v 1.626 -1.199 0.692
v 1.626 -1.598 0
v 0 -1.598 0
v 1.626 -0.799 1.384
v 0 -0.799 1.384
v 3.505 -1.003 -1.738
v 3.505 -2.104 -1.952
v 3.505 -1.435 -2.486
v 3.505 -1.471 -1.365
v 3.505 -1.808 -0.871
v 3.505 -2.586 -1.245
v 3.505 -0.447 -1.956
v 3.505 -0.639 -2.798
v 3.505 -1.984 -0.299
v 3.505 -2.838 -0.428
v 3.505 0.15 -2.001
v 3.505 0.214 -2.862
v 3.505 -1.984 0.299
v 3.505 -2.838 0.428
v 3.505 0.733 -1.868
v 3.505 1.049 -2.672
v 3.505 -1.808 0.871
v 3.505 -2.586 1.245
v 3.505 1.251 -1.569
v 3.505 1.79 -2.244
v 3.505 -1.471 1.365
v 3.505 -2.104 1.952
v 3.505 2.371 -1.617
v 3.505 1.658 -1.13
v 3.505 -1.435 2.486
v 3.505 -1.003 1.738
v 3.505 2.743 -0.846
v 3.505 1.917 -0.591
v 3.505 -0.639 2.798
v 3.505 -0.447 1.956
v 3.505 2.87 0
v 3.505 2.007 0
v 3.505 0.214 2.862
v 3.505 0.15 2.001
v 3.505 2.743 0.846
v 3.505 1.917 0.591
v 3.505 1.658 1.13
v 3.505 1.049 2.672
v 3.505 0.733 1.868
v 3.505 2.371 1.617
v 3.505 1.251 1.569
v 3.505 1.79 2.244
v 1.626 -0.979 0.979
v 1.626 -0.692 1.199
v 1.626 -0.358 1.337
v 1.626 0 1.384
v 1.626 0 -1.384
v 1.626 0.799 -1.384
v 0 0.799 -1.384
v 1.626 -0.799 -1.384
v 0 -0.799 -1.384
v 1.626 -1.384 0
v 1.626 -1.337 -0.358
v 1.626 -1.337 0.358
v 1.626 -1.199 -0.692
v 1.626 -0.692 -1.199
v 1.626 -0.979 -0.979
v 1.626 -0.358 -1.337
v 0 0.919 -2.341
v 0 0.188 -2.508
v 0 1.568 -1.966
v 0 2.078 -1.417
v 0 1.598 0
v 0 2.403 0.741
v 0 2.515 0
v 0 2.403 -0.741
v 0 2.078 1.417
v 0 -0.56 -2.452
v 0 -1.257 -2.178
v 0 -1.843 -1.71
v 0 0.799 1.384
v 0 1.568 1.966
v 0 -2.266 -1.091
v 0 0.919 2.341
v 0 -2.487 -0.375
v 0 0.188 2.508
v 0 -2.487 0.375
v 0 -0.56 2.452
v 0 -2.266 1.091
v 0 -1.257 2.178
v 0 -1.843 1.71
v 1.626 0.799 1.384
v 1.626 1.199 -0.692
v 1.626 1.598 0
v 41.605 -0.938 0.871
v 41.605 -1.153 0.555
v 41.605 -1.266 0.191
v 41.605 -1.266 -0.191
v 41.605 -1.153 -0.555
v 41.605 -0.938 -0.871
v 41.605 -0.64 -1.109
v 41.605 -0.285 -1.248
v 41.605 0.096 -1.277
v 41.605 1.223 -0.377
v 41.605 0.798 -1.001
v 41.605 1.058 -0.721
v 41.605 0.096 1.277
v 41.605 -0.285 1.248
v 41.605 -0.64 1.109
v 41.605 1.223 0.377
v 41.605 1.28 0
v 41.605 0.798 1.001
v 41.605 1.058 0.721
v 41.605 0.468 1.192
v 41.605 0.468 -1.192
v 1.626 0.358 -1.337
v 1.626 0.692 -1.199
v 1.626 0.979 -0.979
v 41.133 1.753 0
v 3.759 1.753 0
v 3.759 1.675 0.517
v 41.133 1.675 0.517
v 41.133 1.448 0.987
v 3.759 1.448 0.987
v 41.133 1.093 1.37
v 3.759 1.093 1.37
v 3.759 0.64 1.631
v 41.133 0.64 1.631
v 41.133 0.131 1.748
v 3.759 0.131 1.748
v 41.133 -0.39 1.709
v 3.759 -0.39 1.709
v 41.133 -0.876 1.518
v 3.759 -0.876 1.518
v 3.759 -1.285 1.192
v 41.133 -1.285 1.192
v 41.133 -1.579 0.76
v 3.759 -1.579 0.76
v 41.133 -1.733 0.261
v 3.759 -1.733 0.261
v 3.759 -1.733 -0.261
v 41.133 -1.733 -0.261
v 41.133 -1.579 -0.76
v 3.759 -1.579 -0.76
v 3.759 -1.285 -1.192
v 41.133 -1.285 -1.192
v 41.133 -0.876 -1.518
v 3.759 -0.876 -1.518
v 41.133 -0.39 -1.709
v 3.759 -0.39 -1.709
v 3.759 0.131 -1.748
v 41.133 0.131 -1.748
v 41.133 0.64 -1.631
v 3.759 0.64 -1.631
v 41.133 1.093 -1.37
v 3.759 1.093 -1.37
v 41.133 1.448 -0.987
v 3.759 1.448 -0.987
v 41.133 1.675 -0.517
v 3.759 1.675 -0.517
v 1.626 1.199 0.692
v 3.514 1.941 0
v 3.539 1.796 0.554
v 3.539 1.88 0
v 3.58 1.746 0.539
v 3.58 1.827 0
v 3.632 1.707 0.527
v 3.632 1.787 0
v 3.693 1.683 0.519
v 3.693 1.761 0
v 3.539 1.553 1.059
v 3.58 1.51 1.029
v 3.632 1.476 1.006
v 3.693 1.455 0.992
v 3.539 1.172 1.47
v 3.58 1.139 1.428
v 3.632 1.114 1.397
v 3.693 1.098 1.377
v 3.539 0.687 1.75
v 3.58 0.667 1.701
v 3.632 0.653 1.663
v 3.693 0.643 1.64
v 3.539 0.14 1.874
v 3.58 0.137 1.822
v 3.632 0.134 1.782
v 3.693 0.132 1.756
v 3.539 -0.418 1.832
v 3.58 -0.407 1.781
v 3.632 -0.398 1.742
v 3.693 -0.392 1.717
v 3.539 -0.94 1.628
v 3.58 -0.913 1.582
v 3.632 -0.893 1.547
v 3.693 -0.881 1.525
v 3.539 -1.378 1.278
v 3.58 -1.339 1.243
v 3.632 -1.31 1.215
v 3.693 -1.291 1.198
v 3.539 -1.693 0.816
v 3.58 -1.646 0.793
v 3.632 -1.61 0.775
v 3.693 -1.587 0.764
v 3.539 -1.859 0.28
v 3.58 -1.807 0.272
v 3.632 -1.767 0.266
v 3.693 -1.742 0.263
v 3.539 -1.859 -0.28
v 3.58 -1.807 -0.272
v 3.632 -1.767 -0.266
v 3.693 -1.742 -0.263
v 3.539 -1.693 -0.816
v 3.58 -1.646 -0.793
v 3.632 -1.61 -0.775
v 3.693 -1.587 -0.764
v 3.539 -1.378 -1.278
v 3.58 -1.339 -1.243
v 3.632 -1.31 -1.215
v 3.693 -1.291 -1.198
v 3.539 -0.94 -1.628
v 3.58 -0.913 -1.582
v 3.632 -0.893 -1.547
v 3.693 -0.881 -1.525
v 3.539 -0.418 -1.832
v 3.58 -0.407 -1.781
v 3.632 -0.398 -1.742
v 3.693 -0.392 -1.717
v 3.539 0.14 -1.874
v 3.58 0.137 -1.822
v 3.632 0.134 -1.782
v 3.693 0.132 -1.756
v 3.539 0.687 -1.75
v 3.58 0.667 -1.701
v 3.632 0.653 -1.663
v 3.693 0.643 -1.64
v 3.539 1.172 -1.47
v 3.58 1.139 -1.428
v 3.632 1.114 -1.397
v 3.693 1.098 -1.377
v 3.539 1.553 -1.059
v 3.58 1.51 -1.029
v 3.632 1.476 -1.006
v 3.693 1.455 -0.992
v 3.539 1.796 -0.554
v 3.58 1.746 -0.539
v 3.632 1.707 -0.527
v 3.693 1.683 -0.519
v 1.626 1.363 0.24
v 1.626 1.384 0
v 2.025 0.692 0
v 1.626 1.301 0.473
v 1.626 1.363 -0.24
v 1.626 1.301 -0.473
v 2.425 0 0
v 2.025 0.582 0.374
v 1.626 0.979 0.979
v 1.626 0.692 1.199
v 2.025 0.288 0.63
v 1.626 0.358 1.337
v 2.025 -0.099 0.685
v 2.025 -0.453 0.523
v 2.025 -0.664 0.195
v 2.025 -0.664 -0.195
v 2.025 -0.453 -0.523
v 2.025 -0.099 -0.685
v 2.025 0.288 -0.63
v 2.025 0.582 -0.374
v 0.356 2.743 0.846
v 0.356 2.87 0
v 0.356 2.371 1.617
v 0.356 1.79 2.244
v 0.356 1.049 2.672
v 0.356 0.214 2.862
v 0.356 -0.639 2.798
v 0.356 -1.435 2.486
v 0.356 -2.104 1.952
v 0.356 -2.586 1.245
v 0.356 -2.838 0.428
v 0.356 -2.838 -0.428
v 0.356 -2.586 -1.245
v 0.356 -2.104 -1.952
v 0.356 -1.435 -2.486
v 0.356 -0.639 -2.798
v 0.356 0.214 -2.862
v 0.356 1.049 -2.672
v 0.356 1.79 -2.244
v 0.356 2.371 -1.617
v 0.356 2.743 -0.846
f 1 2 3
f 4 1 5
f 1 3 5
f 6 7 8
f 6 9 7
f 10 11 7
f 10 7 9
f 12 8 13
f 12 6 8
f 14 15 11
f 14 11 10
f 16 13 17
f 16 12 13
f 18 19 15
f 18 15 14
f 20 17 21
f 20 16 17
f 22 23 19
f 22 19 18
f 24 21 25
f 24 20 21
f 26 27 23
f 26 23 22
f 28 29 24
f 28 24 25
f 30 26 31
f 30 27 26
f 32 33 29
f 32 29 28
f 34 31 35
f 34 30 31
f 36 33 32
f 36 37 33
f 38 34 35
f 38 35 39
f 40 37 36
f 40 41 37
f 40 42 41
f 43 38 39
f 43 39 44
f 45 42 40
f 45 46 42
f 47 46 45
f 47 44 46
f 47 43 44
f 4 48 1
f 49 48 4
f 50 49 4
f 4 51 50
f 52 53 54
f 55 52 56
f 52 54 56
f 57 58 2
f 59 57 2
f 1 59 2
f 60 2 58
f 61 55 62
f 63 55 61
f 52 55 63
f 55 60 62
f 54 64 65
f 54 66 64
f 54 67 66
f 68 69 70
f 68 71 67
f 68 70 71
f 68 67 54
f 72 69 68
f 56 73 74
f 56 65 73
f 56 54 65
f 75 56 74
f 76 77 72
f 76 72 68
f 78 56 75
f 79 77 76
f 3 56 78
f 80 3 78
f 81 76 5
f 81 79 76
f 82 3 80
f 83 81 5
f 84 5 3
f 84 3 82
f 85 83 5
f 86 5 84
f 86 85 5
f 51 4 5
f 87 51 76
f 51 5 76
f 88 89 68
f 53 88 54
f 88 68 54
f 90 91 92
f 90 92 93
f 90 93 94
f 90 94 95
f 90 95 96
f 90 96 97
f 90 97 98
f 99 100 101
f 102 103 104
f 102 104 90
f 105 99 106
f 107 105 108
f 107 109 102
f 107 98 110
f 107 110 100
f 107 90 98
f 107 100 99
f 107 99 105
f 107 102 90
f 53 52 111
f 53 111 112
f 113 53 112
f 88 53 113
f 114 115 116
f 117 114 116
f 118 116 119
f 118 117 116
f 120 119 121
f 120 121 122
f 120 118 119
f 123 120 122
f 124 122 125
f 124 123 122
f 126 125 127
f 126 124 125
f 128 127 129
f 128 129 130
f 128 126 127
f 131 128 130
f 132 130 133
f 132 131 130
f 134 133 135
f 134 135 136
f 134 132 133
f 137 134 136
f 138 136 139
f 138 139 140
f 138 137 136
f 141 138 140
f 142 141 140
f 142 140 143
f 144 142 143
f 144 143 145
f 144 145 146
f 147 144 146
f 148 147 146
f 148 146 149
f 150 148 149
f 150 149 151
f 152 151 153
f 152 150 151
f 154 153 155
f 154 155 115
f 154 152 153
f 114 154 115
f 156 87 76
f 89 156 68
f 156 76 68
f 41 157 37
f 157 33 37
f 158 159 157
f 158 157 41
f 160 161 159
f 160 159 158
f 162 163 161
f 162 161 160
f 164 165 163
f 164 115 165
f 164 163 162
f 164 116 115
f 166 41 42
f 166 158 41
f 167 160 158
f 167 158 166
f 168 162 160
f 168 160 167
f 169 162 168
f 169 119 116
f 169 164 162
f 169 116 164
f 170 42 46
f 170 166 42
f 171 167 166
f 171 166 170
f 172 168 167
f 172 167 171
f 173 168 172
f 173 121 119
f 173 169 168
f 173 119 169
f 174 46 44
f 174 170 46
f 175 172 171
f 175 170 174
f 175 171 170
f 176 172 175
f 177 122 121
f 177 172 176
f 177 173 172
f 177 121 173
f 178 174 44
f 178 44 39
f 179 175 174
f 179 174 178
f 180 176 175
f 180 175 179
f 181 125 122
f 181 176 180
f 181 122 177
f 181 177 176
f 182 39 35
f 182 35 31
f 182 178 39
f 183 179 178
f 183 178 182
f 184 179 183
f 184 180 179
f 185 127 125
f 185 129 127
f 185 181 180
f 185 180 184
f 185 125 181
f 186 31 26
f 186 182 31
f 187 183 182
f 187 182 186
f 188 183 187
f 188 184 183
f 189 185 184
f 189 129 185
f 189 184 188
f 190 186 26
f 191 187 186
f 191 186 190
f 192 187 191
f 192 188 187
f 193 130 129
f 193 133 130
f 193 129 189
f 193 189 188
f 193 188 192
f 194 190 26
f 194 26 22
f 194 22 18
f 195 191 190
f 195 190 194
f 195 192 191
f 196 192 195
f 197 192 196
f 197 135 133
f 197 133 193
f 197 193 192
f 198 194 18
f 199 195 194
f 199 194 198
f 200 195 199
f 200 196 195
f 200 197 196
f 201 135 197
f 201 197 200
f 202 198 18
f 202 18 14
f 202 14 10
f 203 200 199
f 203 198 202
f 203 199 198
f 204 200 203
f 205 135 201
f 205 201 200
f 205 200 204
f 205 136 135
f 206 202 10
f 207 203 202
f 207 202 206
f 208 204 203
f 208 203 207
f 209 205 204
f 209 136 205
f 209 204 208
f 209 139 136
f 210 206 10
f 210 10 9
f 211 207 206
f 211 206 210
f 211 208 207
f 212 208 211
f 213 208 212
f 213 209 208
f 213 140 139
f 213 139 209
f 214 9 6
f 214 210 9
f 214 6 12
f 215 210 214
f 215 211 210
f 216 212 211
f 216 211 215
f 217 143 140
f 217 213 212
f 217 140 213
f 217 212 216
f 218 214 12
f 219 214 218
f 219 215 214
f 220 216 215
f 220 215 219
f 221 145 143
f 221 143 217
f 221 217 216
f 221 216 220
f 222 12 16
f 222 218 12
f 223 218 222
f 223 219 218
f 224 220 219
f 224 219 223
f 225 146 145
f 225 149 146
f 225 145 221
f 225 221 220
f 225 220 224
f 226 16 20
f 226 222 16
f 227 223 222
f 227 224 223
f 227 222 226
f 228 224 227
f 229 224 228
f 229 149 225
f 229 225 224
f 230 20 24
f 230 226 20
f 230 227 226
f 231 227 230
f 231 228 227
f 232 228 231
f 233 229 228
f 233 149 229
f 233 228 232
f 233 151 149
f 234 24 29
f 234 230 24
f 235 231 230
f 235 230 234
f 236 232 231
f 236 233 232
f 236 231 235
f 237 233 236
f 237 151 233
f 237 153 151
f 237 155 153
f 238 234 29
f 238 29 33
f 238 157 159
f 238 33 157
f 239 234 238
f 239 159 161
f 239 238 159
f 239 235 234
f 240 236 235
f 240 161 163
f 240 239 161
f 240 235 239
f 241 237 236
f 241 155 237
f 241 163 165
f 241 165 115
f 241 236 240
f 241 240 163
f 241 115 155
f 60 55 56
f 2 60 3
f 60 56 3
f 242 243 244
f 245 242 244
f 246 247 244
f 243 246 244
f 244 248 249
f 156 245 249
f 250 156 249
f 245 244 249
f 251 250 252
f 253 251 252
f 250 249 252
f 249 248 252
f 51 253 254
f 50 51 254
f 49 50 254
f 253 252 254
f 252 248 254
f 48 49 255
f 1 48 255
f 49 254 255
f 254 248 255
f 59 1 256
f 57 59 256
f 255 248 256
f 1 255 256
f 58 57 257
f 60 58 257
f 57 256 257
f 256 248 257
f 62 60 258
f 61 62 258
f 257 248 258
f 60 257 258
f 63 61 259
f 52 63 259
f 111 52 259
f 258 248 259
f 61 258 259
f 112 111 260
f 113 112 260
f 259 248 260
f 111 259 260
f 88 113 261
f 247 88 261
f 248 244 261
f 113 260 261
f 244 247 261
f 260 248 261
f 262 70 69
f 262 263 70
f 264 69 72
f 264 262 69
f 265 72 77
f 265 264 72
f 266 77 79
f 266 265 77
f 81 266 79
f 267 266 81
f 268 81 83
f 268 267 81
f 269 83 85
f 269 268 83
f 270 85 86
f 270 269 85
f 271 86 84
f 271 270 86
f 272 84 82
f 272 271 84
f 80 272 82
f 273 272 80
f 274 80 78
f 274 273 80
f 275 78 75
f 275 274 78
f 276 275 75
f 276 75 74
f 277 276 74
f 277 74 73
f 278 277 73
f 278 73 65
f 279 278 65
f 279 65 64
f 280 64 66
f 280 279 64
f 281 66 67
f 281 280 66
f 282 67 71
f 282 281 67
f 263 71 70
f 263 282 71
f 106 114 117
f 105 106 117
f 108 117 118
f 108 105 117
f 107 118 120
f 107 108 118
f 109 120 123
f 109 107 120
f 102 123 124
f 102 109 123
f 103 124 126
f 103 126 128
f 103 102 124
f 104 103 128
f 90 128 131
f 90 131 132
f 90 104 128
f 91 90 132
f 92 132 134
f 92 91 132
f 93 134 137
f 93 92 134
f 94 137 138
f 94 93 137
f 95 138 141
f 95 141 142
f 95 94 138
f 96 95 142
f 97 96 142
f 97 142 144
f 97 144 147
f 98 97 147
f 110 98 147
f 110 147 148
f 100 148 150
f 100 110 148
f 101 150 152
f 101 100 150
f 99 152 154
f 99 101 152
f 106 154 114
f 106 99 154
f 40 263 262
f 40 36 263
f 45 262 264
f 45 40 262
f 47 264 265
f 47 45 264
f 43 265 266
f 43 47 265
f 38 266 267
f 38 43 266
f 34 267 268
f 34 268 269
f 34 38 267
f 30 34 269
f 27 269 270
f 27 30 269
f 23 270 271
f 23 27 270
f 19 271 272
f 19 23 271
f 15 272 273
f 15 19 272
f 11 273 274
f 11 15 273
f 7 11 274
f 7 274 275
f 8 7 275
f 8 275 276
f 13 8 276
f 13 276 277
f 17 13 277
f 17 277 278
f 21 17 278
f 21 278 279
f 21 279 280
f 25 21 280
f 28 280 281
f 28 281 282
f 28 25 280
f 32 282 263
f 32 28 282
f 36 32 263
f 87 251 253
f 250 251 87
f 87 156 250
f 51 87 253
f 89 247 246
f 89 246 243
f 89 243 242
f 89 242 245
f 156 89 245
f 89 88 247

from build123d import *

# Parameters (mm, degrees)
FILLET1_R   = 0.254
HEX_2_DEPTH = 1.6256


with BuildPart() as part:
    # BodySke → Base-Revolve (revolve)
    with BuildSketch(Plane.XY):
        Polygon((0, 0), (0, 2.5146), (0.3556, 2.8702), (3.5052, 2.8702), (3.5052, 1.7526), (41.13276, 1.7526), (41.6052, 1.28016), (41.6052, 0), align=None)
    revolve(axis=Axis((-31.75, 0, 0), (1, 0, 0)))

    # Fillet1
    fillet1_edges = [part.edges().sort_by_distance(p)[0] for p in [
        (3.5052, -1.7526, 0),
    ]]
    fillet(fillet1_edges, radius=FILLET1_R)

    # Sketch2 → Hex-PreBroach (revolve, cut)
    with BuildSketch(Plane.XY):
        Polygon((0, 1.3843), (1.6256, 1.3843), (2.424825978, 0), (0, 0), align=None)
    revolve(axis=Axis((0, 0, 0), (1, 0, 0)), mode=Mode.SUBTRACT)

    # Sketch3 → Hex 2 (cut)
    with BuildSketch(Plane(origin=(0, 0, 0), x_dir=(0, 0.5, 0.866025404), z_dir=(-1, 0, 0))):
        Polygon((0.799225978, 1.3843), (-0.799225978, 1.3843), (-1.598451955, 0), (-0.799225978, -1.3843), (0.799225978, -1.3843), (1.598451955, 0), align=None)
    extrude(amount=-HEX_2_DEPTH, mode=Mode.SUBTRACT)


solid = part.part
